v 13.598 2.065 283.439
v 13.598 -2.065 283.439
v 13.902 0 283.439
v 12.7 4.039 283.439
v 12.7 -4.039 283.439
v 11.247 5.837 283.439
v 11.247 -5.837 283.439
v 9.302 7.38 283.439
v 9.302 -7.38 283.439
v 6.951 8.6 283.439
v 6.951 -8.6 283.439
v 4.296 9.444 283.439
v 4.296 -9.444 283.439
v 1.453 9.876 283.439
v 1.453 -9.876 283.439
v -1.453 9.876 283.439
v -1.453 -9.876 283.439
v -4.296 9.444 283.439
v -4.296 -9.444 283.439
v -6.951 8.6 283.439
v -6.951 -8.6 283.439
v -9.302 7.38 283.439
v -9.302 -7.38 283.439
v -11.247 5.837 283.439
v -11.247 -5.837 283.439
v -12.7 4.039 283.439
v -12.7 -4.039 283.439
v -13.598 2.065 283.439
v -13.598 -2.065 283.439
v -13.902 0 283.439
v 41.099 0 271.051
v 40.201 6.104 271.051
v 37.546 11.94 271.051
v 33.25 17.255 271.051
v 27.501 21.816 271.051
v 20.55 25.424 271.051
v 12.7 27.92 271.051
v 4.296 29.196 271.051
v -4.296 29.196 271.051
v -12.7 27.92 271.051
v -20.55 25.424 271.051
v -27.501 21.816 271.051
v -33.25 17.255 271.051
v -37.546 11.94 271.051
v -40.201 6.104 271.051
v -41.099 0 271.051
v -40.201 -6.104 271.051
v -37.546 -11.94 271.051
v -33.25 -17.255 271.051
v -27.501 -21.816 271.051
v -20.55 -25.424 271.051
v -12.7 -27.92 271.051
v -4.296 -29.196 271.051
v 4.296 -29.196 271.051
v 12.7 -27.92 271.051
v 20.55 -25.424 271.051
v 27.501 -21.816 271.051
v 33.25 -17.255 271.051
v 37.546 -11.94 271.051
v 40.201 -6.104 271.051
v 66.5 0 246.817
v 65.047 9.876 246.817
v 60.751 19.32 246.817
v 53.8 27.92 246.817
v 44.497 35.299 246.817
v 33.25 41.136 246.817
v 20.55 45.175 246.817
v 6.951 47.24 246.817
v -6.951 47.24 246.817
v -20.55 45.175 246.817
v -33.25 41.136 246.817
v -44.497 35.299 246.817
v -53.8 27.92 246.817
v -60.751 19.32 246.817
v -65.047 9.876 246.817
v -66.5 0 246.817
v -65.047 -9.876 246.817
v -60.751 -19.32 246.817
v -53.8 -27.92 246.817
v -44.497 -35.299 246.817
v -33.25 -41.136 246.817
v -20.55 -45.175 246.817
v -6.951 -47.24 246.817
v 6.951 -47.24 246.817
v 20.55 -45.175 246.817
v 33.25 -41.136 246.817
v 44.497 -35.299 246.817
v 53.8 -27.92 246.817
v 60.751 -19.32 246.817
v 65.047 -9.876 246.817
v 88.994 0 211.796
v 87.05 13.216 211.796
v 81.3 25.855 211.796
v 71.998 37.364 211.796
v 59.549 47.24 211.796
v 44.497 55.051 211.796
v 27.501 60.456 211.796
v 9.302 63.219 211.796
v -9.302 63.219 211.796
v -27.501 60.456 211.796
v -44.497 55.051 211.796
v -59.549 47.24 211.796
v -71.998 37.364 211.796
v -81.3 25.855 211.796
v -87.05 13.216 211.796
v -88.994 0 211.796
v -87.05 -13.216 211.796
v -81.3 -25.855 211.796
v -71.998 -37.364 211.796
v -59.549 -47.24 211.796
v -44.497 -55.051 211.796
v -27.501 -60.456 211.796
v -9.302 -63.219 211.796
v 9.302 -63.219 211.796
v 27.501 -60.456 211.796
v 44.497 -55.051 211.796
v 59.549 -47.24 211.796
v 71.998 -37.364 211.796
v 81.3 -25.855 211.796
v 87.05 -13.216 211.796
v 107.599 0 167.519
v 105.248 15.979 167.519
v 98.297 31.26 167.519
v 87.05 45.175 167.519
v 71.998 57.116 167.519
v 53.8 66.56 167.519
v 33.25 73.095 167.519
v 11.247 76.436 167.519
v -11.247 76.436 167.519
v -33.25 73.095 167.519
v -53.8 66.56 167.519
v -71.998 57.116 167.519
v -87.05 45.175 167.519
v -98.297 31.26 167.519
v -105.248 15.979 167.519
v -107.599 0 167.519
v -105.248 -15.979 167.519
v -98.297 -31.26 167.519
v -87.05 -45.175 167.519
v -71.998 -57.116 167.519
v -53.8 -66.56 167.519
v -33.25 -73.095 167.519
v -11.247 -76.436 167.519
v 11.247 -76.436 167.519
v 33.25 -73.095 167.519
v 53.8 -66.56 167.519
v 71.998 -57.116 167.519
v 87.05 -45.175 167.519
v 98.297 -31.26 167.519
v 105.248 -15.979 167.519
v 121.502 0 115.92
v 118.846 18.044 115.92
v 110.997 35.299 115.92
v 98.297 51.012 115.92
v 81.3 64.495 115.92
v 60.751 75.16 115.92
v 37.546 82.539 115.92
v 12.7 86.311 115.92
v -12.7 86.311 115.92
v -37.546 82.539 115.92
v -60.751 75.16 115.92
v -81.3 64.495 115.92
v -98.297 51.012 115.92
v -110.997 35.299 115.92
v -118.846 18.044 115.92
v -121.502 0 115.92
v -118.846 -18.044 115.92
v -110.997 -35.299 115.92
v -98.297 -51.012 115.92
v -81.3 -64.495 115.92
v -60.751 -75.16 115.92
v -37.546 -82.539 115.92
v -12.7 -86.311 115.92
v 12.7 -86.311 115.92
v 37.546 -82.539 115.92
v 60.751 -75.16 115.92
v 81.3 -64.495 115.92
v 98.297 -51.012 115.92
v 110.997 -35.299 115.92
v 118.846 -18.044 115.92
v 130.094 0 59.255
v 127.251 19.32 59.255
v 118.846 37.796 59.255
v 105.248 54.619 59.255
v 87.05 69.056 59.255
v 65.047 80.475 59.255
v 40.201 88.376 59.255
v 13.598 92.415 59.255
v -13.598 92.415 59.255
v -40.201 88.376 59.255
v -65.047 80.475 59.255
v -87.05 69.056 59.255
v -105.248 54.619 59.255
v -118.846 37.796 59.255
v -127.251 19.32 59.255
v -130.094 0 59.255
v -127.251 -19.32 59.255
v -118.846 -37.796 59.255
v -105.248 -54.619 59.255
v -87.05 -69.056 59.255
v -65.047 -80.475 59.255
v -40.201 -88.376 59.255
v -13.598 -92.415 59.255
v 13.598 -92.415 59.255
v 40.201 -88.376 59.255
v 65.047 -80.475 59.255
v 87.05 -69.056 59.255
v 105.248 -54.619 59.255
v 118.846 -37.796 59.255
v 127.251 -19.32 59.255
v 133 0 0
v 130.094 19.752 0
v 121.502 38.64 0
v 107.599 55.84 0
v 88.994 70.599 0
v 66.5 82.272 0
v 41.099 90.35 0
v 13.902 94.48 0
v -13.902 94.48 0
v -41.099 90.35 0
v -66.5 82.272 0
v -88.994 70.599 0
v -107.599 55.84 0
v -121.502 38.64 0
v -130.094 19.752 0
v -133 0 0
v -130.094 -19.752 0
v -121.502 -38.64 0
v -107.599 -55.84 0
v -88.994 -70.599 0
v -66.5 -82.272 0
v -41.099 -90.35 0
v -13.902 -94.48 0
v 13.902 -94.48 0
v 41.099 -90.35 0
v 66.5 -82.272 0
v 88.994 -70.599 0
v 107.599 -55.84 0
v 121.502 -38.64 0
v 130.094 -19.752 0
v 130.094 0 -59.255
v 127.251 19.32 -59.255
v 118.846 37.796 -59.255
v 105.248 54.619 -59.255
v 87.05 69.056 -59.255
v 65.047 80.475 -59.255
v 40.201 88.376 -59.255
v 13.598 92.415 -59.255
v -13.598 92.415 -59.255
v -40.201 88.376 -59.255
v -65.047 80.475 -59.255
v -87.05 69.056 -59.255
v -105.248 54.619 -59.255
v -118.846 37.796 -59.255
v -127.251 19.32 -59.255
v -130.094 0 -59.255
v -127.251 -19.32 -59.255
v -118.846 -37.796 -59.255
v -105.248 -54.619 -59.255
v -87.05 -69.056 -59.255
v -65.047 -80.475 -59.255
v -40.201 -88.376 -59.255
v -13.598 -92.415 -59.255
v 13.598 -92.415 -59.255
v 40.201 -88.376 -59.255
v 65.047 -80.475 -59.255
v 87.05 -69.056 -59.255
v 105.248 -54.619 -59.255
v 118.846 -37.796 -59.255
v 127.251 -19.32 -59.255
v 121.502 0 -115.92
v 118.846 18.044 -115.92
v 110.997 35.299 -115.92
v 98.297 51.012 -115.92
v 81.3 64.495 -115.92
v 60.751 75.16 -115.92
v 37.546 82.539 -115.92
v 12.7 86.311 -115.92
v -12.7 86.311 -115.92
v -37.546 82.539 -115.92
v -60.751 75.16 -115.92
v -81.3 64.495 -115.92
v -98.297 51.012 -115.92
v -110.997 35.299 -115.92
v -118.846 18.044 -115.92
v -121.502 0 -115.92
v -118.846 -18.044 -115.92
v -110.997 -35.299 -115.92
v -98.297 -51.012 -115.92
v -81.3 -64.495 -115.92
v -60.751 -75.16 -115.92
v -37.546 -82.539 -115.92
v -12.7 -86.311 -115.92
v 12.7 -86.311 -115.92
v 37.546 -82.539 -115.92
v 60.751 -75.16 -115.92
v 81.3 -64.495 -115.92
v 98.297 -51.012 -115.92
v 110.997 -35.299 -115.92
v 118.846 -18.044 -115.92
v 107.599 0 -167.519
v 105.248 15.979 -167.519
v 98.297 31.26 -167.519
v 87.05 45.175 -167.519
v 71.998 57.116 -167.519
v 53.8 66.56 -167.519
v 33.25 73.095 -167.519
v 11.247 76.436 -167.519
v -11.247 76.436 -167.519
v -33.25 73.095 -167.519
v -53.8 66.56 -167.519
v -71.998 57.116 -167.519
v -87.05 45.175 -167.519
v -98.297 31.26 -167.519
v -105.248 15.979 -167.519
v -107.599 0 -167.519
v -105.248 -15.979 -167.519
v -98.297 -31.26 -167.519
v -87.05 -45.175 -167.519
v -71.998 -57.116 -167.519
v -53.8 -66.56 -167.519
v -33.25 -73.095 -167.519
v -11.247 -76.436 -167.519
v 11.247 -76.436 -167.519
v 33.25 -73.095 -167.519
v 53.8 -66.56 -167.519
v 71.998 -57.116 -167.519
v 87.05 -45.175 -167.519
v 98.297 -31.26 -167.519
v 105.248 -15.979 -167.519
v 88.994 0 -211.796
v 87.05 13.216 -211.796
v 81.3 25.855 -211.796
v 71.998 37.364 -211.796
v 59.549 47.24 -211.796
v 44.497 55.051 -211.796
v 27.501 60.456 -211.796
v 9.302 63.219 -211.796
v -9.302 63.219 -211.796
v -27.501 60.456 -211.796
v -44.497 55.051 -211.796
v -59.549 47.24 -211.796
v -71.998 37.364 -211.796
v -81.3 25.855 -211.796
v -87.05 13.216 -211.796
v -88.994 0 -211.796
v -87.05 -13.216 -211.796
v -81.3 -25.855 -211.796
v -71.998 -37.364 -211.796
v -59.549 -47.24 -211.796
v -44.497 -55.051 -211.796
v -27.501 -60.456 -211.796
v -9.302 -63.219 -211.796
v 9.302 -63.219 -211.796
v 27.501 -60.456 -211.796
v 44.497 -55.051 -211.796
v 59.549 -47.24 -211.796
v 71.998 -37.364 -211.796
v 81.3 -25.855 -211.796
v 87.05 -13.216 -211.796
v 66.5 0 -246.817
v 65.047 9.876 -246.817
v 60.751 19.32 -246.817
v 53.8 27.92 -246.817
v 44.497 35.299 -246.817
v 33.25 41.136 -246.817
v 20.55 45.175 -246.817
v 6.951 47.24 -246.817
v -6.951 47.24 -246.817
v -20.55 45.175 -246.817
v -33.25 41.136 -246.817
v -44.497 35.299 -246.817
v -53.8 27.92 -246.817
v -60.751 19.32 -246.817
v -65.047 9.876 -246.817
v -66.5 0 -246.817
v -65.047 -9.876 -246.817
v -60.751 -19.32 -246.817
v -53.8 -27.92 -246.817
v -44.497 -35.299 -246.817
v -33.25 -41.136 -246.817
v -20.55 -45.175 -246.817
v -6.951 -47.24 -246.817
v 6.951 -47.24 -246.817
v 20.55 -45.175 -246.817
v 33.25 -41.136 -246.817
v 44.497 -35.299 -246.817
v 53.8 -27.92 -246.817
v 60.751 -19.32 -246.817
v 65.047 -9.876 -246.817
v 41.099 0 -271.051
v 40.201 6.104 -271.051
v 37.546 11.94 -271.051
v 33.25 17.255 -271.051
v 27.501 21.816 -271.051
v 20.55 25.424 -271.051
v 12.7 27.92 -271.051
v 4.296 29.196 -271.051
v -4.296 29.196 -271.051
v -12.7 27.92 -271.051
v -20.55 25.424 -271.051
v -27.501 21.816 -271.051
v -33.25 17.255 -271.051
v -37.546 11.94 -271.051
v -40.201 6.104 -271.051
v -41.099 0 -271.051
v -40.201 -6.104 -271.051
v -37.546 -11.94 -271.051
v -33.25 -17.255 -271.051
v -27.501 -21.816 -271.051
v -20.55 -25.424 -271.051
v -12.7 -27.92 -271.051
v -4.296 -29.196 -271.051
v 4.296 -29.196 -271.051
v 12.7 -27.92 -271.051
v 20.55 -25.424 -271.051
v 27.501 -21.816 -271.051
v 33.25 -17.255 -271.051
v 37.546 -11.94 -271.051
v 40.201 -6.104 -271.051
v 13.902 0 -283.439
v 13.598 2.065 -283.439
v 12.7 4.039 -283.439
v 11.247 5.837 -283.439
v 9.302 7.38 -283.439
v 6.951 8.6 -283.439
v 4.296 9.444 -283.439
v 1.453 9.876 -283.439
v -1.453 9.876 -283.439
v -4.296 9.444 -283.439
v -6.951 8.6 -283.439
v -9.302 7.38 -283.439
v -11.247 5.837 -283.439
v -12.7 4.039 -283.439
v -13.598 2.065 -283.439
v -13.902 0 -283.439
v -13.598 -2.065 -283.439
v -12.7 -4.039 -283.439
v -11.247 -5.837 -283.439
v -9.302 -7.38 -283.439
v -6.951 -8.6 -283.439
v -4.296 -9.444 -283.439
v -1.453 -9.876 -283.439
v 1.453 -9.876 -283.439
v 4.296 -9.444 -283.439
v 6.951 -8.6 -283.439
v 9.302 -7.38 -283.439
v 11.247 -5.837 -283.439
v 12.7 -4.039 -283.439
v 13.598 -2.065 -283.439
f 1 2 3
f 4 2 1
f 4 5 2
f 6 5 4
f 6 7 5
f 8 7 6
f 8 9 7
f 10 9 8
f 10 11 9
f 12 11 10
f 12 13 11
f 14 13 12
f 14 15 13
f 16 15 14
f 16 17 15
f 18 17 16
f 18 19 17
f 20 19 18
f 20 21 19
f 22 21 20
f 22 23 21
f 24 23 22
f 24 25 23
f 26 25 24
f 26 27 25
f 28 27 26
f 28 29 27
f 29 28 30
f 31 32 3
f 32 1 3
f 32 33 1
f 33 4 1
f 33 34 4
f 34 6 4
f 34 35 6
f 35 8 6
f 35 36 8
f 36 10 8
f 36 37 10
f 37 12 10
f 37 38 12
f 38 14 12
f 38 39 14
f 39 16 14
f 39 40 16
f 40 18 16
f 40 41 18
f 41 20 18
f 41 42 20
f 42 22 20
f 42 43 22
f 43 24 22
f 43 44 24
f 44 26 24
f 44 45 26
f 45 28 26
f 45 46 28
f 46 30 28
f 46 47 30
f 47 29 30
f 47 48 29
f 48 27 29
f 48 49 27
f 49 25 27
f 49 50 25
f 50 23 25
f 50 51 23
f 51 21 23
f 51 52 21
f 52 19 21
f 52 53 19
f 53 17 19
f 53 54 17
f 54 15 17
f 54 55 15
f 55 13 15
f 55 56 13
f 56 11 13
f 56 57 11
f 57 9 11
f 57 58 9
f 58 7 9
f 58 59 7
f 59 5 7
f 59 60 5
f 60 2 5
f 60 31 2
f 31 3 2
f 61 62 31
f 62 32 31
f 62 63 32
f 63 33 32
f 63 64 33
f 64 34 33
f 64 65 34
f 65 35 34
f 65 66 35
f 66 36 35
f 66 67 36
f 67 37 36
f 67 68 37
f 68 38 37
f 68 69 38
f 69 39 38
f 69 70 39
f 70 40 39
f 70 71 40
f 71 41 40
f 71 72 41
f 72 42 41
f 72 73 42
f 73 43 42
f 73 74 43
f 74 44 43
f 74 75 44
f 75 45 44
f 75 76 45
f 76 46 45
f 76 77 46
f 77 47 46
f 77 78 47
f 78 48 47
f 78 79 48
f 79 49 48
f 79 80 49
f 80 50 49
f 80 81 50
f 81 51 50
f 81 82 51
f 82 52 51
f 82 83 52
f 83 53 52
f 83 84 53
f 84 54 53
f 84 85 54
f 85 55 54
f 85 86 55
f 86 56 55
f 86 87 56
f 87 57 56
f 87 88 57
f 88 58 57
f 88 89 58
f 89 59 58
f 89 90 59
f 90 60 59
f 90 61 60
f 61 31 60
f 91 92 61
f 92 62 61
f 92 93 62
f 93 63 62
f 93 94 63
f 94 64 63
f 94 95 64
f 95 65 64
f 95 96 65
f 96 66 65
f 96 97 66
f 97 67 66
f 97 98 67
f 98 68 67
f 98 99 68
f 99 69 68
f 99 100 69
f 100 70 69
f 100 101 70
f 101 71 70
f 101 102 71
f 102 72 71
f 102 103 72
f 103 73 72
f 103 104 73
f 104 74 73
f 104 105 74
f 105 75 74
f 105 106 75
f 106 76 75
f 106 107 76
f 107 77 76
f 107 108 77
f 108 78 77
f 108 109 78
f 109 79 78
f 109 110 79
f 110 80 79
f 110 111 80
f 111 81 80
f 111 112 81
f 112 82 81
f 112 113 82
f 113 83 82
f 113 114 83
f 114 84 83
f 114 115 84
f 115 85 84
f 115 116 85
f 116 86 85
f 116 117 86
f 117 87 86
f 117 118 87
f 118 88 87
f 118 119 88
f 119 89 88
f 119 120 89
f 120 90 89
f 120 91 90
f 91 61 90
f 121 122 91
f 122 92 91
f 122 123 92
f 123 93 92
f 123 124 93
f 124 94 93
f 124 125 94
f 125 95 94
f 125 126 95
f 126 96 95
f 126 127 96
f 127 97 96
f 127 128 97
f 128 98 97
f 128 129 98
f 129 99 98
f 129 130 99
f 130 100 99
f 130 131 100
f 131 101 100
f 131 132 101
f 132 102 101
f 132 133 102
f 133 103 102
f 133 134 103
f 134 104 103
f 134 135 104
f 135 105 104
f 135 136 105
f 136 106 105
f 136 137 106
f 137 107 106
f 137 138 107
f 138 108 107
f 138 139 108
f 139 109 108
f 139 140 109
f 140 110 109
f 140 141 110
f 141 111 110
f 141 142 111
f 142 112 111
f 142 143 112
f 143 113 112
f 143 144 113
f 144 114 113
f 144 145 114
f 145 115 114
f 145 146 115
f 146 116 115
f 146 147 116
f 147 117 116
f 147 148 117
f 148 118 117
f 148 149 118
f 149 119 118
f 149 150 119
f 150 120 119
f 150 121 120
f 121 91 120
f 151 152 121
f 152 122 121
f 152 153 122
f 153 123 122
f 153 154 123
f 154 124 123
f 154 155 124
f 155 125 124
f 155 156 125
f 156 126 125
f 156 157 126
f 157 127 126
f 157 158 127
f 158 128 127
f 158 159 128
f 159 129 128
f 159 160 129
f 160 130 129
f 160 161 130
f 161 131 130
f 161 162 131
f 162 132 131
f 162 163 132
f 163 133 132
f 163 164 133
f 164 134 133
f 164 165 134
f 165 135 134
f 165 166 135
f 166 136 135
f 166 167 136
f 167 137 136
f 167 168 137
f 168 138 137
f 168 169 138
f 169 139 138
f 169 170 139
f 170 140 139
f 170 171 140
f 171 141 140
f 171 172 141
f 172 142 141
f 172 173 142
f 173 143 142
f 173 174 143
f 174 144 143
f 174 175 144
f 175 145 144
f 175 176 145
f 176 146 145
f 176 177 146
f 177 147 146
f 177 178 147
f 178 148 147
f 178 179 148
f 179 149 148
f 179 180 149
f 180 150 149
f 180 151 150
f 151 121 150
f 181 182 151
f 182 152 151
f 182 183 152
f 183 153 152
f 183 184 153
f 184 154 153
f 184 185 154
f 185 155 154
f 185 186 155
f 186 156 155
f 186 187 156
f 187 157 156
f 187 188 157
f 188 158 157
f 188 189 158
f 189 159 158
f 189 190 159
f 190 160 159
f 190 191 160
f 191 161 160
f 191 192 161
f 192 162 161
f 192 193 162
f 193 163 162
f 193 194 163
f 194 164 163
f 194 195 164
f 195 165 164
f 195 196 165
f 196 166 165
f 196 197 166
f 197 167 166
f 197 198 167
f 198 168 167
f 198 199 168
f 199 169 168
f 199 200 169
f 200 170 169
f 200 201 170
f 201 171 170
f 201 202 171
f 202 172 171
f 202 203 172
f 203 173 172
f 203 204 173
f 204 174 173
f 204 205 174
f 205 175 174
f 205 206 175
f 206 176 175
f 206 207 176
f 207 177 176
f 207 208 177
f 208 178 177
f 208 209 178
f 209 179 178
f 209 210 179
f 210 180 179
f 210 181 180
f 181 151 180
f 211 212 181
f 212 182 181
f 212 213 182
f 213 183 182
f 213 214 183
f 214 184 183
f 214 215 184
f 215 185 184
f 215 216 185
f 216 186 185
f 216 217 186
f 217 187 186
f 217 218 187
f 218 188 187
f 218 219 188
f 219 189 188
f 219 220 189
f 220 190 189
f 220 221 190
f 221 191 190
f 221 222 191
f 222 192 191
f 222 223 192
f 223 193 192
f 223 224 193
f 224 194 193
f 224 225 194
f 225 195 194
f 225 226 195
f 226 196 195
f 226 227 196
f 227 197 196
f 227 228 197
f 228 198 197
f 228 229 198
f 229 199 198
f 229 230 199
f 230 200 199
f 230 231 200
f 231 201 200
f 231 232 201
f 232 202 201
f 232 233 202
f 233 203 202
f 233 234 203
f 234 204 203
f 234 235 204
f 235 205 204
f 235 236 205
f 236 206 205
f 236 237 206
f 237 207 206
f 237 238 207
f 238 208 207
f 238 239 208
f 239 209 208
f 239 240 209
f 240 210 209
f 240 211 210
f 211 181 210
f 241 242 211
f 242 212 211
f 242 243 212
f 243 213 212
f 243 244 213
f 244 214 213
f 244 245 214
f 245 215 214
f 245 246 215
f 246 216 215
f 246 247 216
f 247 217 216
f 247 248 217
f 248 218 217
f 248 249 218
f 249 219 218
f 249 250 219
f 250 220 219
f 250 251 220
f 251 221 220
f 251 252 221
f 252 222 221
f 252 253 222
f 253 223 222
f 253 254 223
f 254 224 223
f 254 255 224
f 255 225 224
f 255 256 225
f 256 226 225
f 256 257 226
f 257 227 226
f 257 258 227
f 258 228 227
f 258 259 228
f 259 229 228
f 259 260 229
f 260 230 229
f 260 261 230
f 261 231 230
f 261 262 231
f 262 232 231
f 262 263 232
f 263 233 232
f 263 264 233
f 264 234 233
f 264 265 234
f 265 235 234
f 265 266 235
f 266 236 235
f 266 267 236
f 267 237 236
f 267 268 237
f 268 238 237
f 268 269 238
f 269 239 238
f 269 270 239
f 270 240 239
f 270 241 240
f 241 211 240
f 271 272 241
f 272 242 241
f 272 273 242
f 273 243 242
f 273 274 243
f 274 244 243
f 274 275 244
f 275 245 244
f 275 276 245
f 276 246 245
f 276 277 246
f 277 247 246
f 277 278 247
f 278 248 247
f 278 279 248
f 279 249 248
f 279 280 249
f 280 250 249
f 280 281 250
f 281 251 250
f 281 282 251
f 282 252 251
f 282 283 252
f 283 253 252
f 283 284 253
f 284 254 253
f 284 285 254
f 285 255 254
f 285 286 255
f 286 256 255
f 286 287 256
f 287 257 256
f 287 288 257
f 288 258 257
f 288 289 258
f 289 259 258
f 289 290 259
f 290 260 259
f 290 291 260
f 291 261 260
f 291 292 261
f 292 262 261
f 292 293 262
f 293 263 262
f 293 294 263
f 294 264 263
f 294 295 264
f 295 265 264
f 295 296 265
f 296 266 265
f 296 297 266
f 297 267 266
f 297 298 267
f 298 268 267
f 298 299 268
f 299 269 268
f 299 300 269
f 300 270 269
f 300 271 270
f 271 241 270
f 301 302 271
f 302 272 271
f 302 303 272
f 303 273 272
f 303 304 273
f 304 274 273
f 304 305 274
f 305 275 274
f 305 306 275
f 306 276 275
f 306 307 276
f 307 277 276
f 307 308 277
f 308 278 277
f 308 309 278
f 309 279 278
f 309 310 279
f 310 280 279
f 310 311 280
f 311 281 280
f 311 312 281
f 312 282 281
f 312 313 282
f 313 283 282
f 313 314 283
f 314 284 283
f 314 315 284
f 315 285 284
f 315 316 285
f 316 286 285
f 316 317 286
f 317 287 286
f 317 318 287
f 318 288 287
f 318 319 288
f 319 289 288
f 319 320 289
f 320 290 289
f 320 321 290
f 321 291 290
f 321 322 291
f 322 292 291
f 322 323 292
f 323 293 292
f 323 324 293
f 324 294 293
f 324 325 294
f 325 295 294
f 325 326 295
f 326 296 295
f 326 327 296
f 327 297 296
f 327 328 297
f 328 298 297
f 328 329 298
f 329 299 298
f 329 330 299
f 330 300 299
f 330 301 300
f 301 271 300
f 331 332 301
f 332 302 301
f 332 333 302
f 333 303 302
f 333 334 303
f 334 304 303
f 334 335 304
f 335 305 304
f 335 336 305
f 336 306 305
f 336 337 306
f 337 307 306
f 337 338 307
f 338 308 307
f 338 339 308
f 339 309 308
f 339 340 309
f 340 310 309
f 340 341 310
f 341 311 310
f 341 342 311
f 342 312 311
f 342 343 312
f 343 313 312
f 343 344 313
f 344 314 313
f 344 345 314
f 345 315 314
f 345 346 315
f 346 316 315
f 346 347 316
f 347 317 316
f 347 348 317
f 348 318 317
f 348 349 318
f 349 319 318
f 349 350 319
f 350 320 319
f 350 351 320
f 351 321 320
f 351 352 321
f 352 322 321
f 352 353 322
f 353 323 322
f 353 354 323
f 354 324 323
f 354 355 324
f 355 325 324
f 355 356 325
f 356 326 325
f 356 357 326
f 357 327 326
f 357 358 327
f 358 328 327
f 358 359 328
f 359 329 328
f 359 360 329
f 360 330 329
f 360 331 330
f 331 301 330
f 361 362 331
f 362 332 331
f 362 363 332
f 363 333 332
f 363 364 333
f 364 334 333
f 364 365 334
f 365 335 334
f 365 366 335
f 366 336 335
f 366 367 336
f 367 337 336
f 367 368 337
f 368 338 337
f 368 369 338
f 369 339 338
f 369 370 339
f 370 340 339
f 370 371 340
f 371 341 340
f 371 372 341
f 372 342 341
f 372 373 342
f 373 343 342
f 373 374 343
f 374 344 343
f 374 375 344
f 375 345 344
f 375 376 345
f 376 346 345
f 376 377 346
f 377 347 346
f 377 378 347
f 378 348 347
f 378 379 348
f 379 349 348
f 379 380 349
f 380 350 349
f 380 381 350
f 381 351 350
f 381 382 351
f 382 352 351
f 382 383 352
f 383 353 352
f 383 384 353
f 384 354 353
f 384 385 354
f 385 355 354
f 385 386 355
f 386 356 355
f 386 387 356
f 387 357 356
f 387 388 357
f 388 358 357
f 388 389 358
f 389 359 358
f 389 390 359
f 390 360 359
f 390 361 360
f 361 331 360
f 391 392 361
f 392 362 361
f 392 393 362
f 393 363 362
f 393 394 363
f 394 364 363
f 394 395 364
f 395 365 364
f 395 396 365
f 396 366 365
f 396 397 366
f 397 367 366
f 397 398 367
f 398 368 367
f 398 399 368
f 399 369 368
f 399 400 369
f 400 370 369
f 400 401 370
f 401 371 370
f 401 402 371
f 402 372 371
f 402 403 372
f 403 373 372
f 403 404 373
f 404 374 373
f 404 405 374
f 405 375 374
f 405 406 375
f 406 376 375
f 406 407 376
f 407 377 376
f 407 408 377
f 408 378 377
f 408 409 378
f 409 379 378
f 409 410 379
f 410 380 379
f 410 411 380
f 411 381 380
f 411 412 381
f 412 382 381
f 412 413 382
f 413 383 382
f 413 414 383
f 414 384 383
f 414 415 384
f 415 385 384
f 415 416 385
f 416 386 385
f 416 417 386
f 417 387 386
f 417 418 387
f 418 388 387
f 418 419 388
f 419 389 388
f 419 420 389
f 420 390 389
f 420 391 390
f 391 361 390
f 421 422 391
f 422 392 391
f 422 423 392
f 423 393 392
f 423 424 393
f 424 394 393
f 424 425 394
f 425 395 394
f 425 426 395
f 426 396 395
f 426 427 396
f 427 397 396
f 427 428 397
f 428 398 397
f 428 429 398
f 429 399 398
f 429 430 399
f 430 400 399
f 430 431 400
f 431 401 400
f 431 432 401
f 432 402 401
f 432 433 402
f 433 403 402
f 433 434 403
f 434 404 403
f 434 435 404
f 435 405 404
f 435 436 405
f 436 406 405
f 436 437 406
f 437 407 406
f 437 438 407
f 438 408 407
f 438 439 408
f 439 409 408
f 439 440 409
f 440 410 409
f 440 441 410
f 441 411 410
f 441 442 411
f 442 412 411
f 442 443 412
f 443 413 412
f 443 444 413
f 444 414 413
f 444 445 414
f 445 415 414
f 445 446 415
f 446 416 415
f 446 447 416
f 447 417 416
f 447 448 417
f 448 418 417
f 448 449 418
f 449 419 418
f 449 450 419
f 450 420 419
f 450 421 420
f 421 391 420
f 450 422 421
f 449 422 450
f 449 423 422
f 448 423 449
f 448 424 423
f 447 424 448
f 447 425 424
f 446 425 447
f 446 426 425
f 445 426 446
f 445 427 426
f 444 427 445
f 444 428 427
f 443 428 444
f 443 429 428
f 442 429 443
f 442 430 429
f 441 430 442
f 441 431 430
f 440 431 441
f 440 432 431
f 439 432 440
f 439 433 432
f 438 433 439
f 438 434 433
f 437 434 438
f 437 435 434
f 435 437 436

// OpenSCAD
// Generated by SolidPython 1.0.1 on 2020-07-29 00:46:47


scale(v = [7, 5, 15]) {
	sphere(r = 19);
}
/***********************************************
*********      SolidPython code:      **********
************************************************
 
# import packages: SolidPython
from solid import *
from solid.utils import *
from itertools import chain, combinations, permutations


class Resize:

    def __init__(self, scad_file):
        self.scad_file = scad_file
        #self.scad_file = import_scad(scad_file)
        # cone/cylinder param:
        self.r1 = 0
        self.r2 = 0
        self.h = 0
        # rectangular prism param:
        self.w = 0
        self.l = 0
        # ellipse param:
        self.r = 0

    # import OpenScad code (file name corresponds to shape)


    # classify shape + parameters
    def assign(self, param1, param2, param3):
        if self.scad_file == 'cone.scad':
            self.r1 = param1
            self.r2 = param2
            self.h = param3
        elif self.scad_file == 'cylinder.scad':
            self.r1 = param1
            self.r2 = param2
            self.h = param3
        elif self.scad_file == 'rectangularPrism.scad':
            self.h = param1
            self.l = param2
            self.w = param3
        else:
            self.r = param1
            self.h = param2

    # resize parameters
    def iterate(self):
        x = range(3, 20, 2)
        i = 1
        if self.scad_file == 'cone.scad':
            tempList = list(permutations(x, 2))
            for temp in tempList:
                param1 = temp[0]
                param2 = temp[1]
                filepath = 'produced_scad_files/' + 'cone' + str(param1) + '_' + str(param2) + '_' + '.scad'
                scad_render_to_file(cylinder(h=param1, r1=param2, r2=0), filepath)

        elif self.scad_file == 'cylinder.scad':
            tempList = list(permutations(x, 3))
            for temp in tempList:
                param1 = temp[0]
                param2 = temp[1]
                filepath = 'produced_scad_files/' + 'cylinder' + str(param1) + '_' + str(param2) + '_' + '.scad'
                scad_render_to_file(cylinder(h=param1, r1=param2, r2=param2), filepath)

        elif self.scad_file == 'rectangularPrism.scad':
            tempList = list(permutations(x, 3))
            for temp in tempList:
                param1 = temp[0]
                param2 = temp[1]
                param3 = temp[2]
                filepath = 'produced_scad_files/' + 'rectangularPrism' + str(param1) + '_' + str(param2) + '_' + str(
                    param3) + '.scad'
                scad_render_to_file(cube(size=(param1, param2, param3)), filepath)

        elif self.scad_file == 'ellipse.scad':
            tempList = list(permutations(x, 4))
            for temp in tempList:
                param1 = temp[0]
                param2 = temp[1]
                param3 = temp[2]
                param4 = temp[3]
                filepath = 'produced_scad_files/' + 'ellipse' + str(param1) + '_' + str(param2) + '_' + str(param3) + '_' + str(param4) + '.scad'
                scad_render_to_file(scale([param1, param2, param3])(sphere(r=param4)), filepath)

    def render_to_scadfile(self):
        scad_render_to_file(scad, 'example.scad') 
 
************************************************/
